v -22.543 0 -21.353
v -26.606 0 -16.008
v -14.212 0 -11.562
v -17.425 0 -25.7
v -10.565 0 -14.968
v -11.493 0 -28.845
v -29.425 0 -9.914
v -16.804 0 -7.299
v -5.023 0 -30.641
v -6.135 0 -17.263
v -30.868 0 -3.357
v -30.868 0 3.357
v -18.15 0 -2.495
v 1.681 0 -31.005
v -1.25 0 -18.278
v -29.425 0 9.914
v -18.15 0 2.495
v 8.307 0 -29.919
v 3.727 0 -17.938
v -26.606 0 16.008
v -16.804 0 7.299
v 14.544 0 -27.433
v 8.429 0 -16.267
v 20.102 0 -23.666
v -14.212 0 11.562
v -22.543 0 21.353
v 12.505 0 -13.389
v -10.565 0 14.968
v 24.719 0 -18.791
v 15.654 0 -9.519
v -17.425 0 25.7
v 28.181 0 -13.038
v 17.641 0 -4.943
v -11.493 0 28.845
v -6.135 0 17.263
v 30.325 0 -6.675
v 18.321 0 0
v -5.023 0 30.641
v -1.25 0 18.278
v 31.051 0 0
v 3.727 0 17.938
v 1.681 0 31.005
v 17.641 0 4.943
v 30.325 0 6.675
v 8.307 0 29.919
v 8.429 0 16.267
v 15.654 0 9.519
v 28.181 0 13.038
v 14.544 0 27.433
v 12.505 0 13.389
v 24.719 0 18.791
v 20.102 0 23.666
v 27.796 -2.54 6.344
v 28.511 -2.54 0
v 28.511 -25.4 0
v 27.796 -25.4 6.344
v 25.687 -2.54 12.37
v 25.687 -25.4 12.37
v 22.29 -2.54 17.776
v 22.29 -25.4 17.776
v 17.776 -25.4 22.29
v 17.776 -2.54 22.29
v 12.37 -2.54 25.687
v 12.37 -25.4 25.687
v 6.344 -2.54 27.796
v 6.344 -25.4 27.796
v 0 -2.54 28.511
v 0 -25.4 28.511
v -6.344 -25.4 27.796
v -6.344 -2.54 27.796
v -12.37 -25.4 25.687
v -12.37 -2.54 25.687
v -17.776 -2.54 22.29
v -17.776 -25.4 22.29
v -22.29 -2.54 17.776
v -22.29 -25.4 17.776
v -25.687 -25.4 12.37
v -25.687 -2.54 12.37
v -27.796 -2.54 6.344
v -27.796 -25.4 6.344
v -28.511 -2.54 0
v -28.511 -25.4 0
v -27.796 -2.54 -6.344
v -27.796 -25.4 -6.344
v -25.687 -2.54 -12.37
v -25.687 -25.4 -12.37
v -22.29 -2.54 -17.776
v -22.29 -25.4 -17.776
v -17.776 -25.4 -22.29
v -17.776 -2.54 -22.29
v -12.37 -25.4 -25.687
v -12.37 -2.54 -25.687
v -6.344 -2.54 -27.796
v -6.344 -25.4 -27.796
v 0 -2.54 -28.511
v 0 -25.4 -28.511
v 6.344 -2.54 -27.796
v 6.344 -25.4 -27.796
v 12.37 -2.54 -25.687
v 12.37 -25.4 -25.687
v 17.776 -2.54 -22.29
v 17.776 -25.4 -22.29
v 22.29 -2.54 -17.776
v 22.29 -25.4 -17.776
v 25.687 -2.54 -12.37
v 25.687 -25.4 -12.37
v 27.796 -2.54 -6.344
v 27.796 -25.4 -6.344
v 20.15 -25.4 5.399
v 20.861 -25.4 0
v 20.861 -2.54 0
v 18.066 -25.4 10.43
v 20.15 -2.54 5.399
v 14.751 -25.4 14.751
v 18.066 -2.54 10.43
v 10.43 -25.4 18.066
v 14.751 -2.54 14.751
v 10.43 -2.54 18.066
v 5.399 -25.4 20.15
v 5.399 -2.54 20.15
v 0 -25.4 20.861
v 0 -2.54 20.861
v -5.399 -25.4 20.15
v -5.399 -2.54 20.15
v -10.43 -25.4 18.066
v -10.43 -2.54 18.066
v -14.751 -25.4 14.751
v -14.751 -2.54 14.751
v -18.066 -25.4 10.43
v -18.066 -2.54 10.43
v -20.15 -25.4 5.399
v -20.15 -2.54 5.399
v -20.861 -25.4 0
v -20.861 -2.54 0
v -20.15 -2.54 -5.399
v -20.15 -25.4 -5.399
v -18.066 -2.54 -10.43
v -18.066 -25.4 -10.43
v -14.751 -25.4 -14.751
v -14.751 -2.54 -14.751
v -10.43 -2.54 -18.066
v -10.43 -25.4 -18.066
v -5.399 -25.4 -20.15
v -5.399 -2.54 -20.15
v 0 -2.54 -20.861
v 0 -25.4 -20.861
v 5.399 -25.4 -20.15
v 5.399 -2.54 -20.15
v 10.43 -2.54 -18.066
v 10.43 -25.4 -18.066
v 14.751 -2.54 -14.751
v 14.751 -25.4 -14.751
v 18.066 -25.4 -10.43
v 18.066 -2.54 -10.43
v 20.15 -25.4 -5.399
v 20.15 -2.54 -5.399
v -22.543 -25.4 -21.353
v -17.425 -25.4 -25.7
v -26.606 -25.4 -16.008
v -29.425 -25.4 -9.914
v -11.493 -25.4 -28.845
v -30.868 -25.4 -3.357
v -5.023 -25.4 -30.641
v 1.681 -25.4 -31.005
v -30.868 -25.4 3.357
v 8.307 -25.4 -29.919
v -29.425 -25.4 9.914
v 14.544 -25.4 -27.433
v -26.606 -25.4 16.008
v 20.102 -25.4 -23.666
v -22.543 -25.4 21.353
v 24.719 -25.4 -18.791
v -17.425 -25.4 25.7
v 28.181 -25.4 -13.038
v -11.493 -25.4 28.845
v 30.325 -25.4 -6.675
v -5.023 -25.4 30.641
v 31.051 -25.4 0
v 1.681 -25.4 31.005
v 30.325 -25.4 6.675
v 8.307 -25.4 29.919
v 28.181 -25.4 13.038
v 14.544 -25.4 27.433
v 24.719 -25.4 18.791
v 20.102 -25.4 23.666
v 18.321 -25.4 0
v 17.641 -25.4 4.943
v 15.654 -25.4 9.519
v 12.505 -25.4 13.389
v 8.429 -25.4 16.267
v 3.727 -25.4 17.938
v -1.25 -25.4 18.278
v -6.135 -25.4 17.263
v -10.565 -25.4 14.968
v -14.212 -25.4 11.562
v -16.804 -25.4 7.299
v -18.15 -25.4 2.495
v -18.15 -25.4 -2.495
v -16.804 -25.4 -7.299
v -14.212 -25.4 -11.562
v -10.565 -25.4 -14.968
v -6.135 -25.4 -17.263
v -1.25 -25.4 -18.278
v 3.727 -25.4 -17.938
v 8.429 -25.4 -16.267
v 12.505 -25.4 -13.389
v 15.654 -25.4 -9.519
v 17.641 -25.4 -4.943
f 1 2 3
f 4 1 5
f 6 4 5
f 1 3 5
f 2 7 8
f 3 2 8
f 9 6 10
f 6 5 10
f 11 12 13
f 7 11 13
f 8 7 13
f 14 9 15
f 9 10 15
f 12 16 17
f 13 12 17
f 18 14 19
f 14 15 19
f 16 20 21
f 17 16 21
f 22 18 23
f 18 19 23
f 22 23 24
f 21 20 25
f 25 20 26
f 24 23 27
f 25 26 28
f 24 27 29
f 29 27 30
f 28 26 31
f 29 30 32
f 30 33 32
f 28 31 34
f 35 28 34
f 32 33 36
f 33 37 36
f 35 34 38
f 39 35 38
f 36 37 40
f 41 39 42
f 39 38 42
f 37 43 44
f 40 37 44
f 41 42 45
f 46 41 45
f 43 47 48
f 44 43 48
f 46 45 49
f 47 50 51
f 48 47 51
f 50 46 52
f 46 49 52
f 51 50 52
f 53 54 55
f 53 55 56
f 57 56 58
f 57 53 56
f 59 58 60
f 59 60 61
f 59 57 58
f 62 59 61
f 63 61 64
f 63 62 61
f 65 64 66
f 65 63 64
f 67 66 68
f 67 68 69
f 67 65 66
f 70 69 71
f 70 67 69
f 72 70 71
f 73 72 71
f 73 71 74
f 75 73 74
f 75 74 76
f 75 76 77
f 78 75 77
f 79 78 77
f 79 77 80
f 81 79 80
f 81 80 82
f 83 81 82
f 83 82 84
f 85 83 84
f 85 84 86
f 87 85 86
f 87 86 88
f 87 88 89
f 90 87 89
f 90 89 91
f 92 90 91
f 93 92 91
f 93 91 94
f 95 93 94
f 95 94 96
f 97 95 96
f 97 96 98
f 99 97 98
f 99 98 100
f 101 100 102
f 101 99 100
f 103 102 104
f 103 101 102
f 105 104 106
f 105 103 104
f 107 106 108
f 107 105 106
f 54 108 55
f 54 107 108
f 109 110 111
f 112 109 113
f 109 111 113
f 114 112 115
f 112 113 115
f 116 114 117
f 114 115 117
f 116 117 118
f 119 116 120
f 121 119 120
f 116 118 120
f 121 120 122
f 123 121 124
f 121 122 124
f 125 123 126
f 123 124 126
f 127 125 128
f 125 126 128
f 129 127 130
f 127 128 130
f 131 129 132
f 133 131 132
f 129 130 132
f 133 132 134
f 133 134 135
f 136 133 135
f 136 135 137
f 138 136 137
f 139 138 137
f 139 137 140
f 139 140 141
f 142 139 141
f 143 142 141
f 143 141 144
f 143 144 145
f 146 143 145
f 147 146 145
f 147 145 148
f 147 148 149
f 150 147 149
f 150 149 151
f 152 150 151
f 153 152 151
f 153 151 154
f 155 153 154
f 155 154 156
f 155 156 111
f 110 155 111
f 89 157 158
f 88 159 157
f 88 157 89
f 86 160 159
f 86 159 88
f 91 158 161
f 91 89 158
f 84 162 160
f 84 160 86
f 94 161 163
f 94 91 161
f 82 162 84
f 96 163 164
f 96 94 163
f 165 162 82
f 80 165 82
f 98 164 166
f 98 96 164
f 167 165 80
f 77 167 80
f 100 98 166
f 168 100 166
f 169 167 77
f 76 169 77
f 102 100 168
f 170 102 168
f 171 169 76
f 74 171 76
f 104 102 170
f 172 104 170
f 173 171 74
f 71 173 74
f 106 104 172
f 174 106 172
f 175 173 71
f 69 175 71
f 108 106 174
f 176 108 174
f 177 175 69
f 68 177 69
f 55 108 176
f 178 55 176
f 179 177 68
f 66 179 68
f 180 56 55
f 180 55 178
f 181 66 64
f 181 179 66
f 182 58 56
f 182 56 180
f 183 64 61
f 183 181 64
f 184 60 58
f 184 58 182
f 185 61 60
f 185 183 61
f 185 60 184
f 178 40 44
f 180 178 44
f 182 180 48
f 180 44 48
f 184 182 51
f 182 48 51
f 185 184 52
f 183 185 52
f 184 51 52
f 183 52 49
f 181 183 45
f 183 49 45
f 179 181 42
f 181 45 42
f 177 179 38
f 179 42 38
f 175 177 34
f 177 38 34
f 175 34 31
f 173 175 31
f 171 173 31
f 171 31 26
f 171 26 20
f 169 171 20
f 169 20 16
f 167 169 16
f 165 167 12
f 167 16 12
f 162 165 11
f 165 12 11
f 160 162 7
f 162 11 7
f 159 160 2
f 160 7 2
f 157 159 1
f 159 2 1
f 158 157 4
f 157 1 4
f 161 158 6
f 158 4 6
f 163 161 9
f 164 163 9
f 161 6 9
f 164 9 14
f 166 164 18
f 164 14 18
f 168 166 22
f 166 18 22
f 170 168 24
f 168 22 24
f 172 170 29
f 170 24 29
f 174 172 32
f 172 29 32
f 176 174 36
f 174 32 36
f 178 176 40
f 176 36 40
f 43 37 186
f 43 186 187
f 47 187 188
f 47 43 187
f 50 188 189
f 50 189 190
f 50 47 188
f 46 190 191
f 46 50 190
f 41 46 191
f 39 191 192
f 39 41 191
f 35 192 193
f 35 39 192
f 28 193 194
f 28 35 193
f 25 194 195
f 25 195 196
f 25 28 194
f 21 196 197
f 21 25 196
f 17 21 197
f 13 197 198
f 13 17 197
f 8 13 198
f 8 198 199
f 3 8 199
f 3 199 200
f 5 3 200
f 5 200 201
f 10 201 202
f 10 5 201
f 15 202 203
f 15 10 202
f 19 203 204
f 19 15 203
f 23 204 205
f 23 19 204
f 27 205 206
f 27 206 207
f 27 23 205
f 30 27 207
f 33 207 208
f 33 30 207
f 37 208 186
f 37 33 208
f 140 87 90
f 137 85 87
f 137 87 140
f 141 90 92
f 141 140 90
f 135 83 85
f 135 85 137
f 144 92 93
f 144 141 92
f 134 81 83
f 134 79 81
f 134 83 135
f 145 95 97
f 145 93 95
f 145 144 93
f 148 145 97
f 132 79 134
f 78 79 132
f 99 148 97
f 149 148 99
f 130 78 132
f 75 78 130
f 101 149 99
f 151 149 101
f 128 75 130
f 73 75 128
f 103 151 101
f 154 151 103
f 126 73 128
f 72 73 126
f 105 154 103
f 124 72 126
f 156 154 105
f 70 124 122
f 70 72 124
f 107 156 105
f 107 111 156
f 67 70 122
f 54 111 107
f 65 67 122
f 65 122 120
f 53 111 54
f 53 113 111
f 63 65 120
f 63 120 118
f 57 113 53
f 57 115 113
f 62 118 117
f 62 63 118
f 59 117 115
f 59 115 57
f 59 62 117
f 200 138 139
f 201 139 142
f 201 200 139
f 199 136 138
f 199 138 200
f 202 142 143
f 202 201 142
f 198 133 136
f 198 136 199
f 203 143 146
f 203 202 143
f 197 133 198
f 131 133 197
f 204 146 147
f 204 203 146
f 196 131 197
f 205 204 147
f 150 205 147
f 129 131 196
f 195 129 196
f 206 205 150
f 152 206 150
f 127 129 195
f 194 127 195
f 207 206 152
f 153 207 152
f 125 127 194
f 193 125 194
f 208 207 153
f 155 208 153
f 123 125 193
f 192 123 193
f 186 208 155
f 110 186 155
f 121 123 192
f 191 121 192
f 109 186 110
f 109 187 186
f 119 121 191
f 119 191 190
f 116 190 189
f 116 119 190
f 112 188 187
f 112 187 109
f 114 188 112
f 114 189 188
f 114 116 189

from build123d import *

# Parameters (mm, degrees)
F0_R     = 31.050501
F0_R_2   = 18.320769
F1_DEPTH = 25.4
F2_T     = -2.54


with BuildPart() as f1:
    # F0 (on Front) → F1 (new body)
    with BuildSketch(Plane.XZ):
        Circle(F0_R)
        Circle(F0_R_2, mode=Mode.SUBTRACT)
    extrude(amount=F1_DEPTH)

    # F2
    f2_openings = [f1.faces().sort_by_distance(p)[0] for p in [
        (-30.17226, -25.4, 0),
    ]]
    offset(amount=F2_T, openings=f2_openings)


solid = f1.part
